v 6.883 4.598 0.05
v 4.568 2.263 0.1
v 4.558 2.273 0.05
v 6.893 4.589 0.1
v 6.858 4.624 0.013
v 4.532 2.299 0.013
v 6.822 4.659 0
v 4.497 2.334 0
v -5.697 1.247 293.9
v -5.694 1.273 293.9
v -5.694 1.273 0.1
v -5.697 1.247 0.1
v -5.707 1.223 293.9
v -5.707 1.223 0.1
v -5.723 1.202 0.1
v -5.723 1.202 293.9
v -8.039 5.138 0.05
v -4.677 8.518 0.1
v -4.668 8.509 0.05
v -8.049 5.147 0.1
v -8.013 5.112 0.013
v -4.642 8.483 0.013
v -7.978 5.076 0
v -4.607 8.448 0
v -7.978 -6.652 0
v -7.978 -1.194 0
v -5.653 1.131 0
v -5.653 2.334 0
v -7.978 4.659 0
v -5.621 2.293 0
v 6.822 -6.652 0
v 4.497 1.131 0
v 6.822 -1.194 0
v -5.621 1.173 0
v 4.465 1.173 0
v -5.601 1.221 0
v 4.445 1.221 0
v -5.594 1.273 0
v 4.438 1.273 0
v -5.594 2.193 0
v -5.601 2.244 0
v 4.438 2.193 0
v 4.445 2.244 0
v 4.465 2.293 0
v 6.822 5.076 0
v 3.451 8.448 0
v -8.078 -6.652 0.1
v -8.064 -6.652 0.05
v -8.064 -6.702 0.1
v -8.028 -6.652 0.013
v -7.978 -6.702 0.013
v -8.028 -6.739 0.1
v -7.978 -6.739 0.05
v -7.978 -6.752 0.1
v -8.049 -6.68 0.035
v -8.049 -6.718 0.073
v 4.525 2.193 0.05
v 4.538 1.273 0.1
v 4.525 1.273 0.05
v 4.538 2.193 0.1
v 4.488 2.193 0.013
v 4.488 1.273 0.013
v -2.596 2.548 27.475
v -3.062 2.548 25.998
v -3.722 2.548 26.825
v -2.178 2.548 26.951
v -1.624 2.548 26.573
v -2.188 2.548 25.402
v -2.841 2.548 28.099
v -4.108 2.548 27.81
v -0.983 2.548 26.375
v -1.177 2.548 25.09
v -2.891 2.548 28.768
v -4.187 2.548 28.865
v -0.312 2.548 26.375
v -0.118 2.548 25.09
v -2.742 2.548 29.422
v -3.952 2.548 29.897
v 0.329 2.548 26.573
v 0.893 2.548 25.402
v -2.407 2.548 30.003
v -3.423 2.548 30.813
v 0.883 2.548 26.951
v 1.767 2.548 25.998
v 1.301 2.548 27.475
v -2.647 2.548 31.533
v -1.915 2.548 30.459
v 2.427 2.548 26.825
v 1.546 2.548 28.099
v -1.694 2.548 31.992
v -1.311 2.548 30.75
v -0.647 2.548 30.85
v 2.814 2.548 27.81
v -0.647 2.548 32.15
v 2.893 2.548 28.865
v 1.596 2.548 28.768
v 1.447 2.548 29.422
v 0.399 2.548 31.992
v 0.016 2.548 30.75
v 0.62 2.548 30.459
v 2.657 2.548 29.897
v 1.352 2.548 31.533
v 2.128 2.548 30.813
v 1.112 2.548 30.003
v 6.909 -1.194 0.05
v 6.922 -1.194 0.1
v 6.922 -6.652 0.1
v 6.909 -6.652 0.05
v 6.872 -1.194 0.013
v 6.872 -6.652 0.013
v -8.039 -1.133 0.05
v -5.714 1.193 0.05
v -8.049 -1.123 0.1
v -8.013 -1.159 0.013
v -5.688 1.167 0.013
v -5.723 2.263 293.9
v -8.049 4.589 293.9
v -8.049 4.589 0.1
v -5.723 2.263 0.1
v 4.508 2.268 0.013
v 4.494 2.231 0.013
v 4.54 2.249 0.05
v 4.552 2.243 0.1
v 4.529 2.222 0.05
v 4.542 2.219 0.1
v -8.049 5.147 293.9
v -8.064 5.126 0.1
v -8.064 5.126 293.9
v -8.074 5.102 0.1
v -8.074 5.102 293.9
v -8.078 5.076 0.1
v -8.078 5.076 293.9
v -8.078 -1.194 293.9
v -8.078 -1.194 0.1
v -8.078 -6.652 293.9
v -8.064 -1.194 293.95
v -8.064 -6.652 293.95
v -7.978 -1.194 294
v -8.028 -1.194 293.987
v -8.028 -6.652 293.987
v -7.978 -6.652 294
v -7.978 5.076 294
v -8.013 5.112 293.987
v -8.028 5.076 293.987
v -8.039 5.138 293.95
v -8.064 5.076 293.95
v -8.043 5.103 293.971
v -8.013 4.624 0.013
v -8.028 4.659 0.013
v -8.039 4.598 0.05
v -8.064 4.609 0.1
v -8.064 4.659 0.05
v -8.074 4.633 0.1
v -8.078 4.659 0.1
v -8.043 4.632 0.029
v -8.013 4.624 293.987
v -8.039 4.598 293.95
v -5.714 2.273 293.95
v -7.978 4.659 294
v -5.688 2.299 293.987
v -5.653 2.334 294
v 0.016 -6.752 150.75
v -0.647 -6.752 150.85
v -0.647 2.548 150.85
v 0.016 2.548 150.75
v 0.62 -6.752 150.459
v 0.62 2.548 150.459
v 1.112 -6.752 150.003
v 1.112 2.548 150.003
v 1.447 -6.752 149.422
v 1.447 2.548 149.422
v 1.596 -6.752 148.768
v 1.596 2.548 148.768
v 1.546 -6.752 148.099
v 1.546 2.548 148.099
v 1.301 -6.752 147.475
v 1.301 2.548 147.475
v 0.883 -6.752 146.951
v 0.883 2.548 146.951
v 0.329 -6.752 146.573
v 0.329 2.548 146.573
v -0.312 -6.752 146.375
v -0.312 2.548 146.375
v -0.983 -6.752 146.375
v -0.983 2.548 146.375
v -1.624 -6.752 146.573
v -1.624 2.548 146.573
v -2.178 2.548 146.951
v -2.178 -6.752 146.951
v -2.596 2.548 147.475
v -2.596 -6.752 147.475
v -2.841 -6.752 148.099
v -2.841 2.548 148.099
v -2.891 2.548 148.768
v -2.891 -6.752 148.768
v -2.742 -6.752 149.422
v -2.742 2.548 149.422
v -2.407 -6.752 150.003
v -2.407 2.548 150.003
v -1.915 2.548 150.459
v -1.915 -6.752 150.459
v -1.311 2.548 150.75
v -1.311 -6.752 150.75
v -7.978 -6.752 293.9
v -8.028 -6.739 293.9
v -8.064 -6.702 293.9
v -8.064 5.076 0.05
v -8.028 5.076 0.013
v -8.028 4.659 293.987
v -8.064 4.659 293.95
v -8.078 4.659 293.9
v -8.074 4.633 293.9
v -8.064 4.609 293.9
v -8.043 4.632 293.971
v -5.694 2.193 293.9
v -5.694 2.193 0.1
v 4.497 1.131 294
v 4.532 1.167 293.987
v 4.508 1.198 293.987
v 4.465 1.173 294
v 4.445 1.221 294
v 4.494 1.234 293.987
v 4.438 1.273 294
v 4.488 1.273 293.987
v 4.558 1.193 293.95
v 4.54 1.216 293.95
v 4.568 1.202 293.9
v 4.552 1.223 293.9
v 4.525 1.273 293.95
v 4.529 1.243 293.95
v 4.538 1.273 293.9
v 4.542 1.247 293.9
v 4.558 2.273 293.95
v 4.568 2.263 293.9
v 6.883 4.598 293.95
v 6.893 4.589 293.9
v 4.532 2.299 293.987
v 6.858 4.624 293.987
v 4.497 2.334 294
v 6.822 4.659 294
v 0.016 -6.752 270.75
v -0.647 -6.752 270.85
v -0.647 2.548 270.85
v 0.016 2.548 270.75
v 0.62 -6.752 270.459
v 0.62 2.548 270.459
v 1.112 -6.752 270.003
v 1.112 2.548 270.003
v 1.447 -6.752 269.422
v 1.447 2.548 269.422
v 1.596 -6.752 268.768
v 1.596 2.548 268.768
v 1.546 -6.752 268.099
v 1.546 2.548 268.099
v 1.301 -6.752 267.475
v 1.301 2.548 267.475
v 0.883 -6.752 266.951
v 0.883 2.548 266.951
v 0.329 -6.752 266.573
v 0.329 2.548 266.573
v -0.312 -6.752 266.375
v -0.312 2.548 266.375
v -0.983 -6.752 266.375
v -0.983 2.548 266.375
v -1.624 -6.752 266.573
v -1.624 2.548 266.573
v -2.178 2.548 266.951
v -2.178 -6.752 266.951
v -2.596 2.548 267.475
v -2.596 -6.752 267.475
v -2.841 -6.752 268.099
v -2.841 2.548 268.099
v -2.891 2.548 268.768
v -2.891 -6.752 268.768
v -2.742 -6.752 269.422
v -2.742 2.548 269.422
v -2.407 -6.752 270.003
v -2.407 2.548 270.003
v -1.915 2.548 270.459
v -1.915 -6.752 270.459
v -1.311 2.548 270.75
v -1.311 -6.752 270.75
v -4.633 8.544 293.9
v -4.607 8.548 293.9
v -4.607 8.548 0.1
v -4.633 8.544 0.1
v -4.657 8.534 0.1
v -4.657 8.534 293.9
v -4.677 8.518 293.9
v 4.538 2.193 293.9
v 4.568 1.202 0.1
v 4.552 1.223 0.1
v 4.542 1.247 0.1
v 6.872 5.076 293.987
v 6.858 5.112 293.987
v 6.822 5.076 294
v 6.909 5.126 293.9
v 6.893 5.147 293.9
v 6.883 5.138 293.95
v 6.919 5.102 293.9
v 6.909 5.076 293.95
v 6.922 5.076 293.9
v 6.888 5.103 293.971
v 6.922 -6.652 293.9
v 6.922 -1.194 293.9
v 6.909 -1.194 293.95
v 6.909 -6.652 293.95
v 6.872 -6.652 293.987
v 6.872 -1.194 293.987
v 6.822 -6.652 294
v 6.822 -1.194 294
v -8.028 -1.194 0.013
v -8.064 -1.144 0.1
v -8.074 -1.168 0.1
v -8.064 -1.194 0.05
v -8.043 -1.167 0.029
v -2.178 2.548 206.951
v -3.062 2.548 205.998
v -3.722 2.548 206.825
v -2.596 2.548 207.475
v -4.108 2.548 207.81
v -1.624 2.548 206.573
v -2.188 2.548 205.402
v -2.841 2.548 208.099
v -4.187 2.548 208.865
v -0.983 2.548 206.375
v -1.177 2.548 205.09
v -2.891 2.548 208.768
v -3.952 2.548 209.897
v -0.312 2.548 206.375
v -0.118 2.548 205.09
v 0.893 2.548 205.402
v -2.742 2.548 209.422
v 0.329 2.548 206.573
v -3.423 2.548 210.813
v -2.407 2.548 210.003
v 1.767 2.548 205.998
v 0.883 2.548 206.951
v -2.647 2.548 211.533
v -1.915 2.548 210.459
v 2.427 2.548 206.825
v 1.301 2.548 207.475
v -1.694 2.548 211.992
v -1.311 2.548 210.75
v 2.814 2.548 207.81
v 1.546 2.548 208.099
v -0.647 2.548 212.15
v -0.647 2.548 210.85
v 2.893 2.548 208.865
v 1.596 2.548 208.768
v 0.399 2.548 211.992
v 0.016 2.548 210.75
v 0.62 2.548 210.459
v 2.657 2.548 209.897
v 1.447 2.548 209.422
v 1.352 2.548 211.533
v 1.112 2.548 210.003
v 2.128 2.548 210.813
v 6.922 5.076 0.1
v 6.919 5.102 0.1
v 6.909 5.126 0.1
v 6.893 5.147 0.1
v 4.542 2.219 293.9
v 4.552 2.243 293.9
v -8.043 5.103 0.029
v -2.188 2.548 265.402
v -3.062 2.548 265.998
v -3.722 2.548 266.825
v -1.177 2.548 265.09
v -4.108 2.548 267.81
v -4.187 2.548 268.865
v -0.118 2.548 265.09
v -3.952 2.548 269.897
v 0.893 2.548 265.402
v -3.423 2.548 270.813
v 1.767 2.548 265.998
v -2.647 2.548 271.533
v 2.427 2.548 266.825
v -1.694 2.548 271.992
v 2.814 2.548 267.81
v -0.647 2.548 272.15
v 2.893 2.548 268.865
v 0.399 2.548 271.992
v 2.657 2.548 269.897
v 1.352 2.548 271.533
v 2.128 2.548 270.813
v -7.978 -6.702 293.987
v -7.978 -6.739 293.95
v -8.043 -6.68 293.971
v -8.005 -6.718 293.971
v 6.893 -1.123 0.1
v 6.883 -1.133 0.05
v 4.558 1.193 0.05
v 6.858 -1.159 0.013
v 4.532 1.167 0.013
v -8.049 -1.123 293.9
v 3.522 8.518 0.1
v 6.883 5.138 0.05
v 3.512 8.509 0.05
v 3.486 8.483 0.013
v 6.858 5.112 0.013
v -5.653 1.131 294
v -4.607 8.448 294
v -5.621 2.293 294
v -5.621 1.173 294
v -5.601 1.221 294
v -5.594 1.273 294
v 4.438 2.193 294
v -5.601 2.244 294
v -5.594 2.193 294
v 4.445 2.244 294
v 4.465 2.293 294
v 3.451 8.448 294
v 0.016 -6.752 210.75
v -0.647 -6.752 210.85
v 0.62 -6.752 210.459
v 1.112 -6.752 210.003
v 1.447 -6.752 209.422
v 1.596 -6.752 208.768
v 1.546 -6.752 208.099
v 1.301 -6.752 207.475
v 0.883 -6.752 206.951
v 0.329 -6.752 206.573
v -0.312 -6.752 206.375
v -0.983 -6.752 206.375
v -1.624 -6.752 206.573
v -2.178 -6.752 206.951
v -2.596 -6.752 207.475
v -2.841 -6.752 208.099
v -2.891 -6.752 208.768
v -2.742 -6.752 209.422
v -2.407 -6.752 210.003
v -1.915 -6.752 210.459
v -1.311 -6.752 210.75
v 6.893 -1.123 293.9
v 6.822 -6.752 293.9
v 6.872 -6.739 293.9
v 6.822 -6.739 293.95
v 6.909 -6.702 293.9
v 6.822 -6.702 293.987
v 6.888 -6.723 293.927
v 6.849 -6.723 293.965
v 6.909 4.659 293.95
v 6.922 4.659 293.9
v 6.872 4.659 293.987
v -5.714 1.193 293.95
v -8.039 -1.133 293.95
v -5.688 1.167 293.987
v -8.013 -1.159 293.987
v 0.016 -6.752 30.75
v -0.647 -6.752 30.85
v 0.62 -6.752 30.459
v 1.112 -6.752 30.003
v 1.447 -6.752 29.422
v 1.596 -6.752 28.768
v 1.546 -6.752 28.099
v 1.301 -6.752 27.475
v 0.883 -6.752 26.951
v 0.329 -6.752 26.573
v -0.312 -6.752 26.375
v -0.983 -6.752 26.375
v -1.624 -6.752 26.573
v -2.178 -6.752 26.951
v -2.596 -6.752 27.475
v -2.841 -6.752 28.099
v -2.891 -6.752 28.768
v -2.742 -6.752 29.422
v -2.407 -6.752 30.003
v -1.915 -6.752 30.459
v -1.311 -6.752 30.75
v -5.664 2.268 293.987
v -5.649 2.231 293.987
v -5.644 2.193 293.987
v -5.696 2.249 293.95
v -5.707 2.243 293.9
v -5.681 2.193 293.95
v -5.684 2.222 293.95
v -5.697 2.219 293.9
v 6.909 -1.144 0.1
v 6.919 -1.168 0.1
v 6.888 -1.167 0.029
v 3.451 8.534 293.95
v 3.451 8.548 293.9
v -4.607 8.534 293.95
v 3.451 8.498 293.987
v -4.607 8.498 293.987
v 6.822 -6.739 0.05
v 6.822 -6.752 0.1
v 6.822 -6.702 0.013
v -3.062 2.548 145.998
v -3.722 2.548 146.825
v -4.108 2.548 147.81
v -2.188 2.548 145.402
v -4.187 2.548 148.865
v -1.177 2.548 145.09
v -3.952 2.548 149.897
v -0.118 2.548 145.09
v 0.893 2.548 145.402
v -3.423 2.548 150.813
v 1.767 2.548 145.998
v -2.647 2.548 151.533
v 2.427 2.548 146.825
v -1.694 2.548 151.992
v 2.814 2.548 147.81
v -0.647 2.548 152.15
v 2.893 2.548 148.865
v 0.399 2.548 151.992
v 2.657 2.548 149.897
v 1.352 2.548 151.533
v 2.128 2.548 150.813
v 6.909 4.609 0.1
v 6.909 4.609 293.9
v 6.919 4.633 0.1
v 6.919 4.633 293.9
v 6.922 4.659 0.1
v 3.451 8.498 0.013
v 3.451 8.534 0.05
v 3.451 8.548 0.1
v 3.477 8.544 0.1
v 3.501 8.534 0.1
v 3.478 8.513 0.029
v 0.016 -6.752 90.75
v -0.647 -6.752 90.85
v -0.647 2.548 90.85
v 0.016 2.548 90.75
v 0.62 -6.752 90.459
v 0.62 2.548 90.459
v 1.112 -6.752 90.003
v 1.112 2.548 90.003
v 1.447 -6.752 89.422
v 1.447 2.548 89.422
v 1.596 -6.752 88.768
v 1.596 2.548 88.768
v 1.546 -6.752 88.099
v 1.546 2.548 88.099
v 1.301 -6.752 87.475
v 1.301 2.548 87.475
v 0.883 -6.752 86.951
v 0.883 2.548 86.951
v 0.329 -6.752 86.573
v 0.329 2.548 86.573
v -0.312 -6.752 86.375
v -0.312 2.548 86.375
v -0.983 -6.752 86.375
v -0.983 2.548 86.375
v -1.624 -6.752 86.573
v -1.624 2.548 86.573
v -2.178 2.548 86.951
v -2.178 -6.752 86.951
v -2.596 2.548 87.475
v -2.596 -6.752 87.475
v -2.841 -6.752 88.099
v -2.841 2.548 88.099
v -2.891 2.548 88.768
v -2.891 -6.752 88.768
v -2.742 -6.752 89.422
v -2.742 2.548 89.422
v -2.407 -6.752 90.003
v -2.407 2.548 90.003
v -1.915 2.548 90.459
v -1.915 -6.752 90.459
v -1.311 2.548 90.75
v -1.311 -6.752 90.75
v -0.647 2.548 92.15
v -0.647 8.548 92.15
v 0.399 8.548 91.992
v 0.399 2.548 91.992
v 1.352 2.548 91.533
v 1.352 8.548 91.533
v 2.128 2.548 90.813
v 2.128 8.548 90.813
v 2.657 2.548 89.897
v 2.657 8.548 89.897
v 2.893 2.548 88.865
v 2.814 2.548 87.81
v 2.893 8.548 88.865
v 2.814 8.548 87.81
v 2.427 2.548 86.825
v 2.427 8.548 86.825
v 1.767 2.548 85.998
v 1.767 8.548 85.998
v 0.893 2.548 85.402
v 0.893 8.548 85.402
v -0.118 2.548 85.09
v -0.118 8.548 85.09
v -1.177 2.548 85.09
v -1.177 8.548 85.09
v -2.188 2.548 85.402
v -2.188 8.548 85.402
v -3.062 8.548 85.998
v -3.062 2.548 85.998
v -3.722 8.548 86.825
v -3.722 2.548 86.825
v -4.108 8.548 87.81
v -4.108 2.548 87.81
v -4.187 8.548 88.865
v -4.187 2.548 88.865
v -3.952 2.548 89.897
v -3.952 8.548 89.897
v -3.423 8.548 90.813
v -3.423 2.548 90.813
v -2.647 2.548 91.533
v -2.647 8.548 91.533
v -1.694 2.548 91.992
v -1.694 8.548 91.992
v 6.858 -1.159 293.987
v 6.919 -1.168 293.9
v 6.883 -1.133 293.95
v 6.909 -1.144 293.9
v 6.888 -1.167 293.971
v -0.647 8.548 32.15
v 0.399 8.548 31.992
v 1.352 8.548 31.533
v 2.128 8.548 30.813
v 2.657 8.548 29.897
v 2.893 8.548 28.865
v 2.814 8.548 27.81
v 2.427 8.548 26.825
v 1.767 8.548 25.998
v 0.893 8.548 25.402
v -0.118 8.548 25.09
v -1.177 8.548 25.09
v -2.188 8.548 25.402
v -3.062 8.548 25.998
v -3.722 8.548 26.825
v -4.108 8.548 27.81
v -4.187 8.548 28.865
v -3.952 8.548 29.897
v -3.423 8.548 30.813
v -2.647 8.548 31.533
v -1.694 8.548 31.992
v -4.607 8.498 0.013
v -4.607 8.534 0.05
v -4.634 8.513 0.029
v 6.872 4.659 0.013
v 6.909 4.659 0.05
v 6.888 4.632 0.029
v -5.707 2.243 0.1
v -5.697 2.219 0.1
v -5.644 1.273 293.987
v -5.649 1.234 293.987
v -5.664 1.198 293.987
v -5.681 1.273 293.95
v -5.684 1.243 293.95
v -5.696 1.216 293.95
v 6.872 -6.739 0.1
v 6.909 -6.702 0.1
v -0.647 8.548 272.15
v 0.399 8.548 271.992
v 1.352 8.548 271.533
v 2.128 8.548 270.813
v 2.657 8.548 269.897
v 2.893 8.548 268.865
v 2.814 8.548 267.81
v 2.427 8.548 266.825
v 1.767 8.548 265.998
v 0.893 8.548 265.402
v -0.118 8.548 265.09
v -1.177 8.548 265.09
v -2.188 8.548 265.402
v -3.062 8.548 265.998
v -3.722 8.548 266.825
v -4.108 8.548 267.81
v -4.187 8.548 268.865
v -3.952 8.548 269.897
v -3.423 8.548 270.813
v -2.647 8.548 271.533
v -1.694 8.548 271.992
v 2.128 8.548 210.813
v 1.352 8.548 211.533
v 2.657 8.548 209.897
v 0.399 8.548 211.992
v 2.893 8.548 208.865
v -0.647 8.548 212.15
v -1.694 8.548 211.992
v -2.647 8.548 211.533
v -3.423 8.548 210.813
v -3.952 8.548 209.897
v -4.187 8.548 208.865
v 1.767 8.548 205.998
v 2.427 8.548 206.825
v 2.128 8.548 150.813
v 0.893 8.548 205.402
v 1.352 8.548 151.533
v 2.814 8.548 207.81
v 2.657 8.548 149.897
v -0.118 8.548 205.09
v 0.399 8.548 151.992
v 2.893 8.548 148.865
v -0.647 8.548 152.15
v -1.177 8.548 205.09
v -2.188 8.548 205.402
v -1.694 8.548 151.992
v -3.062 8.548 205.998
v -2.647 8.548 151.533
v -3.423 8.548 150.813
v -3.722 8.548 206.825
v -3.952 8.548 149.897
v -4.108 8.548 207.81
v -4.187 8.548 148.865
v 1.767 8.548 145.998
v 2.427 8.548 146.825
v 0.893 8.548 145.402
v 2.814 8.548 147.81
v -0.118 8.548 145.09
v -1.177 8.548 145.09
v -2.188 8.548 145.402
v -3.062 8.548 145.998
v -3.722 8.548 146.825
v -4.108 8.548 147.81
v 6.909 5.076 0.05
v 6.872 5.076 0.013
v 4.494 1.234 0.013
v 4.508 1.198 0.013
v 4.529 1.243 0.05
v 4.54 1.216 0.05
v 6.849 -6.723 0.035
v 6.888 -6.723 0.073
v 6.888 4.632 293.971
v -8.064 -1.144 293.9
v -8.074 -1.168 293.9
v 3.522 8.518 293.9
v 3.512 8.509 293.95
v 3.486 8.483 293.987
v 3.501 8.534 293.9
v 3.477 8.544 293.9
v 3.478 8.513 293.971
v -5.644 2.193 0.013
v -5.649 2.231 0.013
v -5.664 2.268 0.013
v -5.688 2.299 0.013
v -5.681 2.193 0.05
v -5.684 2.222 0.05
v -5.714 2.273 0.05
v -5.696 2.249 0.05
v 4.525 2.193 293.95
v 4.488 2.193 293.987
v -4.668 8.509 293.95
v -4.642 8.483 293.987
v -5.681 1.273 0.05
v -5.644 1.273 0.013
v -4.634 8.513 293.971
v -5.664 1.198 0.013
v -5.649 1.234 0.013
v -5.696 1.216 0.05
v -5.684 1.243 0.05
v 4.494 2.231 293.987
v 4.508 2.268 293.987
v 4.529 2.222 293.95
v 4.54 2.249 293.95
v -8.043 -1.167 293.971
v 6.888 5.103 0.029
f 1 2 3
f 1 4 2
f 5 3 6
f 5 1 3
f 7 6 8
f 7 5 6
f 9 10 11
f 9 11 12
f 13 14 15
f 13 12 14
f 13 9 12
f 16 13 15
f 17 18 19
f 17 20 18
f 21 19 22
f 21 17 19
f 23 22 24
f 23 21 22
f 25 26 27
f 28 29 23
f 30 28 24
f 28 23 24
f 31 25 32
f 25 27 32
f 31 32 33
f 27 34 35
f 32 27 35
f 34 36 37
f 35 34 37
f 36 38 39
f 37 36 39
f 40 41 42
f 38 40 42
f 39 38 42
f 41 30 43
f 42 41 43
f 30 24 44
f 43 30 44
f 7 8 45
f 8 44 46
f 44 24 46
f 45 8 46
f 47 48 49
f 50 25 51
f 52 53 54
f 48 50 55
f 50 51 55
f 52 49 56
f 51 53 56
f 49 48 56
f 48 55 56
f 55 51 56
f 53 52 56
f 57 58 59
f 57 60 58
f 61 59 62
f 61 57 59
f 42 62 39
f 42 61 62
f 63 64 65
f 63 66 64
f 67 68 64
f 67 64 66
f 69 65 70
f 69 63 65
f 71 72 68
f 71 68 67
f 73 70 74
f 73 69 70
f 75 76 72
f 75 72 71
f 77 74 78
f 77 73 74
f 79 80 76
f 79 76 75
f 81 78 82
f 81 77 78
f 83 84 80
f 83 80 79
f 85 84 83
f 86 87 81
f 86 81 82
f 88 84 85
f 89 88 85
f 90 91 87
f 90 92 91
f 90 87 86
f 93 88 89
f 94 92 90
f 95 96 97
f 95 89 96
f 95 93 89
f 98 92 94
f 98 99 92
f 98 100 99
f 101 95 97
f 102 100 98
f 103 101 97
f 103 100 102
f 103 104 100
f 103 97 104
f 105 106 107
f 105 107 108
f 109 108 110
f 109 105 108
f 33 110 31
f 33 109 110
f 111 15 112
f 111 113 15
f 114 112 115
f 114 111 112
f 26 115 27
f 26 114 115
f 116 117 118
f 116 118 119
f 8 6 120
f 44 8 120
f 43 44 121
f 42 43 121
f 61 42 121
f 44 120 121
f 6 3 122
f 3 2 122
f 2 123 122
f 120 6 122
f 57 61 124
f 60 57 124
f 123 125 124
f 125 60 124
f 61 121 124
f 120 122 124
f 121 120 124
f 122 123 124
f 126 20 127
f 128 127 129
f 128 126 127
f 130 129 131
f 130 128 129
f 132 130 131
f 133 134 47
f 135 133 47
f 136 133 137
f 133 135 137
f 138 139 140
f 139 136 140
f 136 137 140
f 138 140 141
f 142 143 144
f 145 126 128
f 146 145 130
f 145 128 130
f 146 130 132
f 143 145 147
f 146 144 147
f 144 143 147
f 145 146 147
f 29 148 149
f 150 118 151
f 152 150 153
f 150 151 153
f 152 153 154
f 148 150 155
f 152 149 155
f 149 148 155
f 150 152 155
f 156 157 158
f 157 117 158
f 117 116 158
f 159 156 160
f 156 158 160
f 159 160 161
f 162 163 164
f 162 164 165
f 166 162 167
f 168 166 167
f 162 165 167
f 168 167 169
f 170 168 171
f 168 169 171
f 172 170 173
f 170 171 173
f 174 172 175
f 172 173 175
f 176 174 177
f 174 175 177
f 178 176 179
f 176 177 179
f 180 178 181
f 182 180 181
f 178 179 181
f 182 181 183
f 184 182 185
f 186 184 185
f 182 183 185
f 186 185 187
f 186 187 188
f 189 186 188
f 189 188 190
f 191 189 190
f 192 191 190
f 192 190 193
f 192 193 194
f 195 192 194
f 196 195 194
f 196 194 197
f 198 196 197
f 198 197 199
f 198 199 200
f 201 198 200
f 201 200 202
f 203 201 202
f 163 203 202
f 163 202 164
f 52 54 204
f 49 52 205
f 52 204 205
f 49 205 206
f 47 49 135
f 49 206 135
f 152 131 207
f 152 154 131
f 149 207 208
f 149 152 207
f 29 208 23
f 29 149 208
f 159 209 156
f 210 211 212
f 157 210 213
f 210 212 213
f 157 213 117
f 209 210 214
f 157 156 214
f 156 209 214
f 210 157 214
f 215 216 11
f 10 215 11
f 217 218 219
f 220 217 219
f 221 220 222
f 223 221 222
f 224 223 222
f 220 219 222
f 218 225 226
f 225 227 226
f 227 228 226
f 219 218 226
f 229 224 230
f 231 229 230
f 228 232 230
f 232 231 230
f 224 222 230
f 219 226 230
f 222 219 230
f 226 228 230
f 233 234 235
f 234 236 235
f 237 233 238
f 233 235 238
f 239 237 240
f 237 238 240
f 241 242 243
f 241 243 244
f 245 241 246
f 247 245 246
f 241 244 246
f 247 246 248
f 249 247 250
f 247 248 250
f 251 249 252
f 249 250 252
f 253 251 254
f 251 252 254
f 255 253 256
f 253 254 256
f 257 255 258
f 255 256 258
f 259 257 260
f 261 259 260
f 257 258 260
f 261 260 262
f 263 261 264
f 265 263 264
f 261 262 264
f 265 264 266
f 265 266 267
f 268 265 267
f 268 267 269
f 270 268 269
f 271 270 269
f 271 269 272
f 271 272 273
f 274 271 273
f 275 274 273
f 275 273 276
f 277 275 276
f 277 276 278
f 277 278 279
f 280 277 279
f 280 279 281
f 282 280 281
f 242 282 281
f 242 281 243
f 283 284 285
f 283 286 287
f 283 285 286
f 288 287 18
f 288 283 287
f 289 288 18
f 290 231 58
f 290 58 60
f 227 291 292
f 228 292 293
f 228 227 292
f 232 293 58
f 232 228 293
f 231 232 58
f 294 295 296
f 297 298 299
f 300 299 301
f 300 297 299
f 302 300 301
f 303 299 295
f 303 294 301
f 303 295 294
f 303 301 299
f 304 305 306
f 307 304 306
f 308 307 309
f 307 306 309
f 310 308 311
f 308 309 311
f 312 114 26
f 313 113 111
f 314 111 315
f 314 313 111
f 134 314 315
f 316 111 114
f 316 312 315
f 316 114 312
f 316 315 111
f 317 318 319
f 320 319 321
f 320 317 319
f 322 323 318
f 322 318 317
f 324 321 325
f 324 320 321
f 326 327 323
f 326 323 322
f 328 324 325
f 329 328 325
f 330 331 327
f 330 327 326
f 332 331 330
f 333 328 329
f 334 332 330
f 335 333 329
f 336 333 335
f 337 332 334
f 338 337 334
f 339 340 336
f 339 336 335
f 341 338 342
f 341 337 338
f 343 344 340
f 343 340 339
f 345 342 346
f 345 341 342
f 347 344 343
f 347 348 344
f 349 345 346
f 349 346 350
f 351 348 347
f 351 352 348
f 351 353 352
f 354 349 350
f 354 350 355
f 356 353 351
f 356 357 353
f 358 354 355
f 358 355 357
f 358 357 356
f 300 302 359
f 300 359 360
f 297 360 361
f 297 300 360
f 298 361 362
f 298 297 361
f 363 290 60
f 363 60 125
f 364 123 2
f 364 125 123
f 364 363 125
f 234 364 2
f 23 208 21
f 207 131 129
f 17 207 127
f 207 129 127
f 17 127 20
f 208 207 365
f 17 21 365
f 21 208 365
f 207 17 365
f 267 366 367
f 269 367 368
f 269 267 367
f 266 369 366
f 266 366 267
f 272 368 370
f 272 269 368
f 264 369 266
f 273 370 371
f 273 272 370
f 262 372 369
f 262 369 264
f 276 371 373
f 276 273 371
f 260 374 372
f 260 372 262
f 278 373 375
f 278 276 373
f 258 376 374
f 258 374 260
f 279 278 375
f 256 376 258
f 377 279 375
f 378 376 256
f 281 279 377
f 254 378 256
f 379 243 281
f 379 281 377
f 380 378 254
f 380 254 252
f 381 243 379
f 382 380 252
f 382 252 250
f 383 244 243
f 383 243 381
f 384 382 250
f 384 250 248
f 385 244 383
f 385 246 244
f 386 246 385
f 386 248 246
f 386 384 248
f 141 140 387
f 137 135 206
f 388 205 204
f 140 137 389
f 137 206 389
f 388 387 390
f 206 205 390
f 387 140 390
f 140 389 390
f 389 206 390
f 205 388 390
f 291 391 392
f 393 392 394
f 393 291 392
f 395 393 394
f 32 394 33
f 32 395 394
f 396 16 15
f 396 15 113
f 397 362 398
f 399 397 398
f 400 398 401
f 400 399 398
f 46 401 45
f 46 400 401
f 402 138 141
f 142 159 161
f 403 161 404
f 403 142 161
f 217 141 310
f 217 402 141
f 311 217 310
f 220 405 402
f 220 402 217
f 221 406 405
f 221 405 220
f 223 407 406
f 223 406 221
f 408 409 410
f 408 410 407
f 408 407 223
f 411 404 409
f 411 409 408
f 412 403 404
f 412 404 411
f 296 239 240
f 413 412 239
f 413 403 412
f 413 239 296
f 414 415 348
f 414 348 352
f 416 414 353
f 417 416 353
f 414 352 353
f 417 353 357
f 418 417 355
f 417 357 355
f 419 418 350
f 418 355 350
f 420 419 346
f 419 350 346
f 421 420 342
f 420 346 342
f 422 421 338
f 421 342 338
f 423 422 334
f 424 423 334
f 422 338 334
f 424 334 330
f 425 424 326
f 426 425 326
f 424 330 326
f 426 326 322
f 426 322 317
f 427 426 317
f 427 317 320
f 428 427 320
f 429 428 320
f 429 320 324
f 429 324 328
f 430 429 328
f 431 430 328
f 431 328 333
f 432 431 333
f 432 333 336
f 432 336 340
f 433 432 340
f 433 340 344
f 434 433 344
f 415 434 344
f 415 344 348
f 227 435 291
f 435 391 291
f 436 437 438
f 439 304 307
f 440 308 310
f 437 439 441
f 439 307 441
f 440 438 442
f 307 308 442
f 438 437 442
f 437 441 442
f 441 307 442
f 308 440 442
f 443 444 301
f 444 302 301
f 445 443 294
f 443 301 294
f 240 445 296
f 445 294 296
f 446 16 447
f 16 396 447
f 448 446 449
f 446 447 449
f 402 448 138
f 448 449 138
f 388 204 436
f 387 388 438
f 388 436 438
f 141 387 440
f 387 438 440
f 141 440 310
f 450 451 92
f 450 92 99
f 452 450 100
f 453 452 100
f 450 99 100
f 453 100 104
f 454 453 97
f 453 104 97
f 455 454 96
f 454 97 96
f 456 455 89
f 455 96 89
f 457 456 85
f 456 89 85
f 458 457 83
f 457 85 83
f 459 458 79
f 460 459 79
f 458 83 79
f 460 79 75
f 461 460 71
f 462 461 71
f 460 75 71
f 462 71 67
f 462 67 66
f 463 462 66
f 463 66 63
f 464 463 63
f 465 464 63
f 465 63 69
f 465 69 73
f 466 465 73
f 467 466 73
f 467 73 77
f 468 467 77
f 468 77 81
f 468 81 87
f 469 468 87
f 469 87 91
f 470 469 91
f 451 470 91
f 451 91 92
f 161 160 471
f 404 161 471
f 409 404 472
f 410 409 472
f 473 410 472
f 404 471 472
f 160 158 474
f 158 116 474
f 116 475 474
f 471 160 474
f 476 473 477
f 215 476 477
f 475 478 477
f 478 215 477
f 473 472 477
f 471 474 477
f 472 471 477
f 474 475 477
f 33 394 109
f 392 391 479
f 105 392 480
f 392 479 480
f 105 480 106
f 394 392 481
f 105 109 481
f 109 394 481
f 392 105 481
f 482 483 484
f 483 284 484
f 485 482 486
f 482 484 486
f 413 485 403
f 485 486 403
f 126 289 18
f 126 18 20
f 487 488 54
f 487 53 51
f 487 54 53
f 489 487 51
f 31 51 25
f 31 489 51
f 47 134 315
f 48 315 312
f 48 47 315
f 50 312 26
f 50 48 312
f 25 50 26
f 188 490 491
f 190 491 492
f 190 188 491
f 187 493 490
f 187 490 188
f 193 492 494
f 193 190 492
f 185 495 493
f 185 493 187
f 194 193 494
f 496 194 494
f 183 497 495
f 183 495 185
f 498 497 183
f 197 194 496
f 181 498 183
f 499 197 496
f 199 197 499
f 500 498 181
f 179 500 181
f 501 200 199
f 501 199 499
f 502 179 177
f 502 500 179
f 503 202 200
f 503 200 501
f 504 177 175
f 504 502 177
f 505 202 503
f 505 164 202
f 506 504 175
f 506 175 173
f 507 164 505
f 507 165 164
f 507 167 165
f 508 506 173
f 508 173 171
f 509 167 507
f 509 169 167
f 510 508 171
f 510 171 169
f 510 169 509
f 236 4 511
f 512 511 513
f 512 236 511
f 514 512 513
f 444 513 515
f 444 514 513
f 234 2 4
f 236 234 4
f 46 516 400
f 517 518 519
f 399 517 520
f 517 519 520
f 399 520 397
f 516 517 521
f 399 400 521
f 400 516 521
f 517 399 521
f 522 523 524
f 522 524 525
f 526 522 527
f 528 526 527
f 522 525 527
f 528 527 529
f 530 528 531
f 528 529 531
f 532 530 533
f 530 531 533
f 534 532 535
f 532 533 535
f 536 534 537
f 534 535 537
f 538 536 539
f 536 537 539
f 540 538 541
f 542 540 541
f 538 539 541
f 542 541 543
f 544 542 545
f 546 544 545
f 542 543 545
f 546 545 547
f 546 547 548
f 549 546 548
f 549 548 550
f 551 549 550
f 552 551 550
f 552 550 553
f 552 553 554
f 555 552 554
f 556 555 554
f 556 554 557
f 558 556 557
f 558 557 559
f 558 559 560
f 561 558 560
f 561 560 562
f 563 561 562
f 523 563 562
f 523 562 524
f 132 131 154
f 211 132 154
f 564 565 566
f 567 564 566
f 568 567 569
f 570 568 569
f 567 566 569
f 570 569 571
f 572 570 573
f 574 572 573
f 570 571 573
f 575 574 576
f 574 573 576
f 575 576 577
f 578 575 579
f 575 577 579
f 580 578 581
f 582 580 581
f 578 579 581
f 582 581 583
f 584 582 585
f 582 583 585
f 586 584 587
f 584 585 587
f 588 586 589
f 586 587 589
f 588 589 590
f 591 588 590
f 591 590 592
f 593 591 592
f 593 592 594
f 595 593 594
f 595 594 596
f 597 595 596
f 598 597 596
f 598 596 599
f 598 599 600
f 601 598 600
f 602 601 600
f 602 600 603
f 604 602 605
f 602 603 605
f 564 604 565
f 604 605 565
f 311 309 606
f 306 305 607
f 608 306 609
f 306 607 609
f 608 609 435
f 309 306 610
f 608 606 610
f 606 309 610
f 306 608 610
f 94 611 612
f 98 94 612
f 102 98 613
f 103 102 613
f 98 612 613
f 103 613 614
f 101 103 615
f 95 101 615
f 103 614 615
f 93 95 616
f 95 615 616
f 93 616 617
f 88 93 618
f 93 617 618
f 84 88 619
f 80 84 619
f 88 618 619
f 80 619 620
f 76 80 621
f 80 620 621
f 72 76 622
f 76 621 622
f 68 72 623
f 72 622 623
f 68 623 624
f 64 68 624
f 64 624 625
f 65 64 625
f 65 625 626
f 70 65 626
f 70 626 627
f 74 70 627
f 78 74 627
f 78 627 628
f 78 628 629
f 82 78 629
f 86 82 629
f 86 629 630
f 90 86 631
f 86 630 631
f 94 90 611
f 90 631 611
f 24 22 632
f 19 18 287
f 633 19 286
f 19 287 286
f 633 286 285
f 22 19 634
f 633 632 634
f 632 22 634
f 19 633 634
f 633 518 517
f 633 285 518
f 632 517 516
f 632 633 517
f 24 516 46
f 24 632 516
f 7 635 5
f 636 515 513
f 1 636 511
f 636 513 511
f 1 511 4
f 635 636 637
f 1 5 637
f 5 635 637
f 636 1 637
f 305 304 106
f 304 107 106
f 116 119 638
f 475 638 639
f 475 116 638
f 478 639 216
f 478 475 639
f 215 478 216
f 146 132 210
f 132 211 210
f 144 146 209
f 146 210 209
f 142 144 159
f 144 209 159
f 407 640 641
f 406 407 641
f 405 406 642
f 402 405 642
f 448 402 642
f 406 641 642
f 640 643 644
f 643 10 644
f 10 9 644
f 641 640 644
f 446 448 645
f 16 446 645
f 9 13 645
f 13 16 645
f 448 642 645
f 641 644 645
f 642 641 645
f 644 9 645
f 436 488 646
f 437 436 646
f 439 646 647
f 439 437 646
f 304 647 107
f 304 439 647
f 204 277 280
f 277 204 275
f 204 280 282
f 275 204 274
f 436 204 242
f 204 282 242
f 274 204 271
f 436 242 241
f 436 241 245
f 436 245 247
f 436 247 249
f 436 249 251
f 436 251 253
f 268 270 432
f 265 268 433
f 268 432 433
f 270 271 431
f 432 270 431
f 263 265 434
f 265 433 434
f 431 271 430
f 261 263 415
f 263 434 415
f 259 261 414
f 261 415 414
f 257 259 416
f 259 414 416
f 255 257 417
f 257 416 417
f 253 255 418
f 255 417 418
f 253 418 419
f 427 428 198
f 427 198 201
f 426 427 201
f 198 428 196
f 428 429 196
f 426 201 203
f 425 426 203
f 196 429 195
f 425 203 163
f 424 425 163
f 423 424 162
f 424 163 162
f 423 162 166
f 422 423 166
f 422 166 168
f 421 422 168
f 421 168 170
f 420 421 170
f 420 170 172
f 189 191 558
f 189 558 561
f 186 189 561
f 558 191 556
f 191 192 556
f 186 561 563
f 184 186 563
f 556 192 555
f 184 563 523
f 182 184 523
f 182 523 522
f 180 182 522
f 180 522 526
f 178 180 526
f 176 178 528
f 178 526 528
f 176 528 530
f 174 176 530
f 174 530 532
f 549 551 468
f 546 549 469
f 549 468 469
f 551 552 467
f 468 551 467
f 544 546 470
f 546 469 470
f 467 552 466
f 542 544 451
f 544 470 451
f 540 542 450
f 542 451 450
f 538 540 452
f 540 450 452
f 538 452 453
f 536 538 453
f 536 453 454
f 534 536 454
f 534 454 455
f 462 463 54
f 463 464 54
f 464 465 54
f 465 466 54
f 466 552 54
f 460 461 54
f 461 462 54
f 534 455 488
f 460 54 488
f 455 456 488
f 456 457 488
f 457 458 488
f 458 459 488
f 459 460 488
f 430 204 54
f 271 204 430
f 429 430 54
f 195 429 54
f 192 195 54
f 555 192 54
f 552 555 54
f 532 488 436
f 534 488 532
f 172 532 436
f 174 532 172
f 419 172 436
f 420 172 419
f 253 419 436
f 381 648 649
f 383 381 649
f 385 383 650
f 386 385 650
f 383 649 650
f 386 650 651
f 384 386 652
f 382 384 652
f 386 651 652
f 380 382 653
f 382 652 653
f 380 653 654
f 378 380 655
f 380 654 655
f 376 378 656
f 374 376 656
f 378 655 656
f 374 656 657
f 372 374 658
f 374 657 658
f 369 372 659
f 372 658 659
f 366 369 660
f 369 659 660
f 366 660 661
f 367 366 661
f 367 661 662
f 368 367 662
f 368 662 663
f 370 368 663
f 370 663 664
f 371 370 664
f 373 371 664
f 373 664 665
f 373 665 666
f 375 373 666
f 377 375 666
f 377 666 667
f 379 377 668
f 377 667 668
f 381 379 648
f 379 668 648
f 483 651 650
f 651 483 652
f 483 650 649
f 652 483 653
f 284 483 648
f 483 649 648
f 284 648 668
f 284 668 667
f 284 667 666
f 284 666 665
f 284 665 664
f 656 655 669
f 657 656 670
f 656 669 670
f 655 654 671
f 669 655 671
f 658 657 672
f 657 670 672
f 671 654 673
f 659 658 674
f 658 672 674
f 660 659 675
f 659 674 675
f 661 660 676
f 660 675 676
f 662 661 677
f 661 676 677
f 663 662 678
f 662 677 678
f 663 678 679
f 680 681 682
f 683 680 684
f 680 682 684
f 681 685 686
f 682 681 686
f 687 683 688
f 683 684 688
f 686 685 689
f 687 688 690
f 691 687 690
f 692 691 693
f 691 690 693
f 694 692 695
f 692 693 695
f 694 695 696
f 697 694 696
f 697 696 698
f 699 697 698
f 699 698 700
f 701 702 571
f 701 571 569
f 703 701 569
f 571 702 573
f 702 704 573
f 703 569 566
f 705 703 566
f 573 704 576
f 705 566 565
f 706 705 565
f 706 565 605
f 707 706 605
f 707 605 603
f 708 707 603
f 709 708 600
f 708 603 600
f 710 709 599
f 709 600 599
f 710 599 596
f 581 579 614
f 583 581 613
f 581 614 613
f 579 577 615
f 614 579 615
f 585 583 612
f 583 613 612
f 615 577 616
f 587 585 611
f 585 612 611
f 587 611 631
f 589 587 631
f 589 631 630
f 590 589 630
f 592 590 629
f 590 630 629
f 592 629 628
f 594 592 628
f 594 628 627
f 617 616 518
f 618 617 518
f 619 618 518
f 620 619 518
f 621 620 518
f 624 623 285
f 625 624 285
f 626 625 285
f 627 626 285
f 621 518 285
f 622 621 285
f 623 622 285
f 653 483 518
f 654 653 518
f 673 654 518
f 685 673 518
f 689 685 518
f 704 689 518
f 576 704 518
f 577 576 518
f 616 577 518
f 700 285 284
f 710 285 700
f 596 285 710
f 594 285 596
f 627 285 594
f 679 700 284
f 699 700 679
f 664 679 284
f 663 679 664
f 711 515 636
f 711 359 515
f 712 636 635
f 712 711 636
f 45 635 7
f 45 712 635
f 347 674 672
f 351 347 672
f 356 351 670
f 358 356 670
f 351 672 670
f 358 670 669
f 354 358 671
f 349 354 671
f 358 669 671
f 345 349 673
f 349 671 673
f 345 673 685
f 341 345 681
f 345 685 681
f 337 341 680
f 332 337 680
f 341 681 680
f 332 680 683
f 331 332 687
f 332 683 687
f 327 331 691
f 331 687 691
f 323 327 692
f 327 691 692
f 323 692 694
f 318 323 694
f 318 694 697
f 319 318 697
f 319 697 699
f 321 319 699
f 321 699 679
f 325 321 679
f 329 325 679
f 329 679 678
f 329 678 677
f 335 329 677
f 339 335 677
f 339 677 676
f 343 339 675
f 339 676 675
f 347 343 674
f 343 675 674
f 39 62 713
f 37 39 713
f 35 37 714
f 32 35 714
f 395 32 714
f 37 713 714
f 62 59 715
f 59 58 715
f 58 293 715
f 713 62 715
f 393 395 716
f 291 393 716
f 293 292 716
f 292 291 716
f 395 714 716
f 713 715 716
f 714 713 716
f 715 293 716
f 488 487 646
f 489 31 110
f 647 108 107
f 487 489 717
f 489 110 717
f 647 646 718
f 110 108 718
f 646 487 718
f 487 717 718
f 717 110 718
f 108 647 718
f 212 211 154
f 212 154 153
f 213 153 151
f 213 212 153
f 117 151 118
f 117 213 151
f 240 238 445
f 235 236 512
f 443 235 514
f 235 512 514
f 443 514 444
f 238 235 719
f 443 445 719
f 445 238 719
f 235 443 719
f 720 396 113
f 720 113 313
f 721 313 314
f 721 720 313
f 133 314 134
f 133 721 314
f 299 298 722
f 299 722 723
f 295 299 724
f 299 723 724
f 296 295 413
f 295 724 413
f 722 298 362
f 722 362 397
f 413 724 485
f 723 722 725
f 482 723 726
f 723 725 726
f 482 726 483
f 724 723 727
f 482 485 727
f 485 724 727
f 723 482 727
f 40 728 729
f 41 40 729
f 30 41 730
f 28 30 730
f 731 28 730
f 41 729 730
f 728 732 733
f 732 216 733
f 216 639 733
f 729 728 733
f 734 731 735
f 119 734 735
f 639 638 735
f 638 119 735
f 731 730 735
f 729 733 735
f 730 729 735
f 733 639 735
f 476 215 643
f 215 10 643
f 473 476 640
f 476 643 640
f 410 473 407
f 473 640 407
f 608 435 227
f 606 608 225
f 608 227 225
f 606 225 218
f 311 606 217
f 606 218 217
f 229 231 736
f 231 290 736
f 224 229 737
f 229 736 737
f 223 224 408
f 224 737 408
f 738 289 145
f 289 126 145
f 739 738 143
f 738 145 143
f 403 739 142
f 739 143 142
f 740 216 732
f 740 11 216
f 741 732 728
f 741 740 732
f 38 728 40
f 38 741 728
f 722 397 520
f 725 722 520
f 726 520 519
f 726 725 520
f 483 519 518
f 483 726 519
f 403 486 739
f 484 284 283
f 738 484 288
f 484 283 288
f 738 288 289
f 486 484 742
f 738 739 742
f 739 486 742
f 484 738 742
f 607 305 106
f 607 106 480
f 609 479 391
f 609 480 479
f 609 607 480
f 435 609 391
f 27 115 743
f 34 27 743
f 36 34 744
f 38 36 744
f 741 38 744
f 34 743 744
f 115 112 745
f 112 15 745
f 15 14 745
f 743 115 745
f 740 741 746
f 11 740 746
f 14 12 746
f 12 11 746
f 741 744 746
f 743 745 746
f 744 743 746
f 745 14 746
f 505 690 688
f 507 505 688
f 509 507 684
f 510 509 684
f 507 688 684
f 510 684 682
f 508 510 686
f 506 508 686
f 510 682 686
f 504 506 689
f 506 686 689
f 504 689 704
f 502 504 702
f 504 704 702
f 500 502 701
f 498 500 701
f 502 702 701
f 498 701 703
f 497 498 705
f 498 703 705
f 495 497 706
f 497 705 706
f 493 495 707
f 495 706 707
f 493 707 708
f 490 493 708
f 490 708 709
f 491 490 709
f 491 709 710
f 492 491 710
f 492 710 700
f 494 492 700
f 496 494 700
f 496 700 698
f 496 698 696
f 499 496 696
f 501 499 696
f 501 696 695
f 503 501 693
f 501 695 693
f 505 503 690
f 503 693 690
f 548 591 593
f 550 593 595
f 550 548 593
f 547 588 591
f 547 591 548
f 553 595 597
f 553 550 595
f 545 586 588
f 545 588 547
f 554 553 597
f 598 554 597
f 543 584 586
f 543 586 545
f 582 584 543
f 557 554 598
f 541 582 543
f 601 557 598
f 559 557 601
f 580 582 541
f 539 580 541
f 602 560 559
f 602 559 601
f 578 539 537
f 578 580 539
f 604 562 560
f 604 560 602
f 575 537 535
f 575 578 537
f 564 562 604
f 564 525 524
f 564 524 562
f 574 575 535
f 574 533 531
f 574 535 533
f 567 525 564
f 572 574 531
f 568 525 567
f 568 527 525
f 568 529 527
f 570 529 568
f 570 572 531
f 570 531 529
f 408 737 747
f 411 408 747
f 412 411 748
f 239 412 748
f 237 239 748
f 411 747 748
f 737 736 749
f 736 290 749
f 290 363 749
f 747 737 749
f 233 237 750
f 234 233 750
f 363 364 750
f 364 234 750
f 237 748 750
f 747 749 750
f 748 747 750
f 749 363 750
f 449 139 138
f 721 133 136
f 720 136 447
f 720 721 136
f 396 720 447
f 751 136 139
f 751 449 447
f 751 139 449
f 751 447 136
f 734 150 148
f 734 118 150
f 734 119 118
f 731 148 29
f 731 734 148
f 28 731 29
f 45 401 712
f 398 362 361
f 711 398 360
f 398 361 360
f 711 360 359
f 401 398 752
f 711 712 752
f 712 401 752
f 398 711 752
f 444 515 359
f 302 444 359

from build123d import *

# Parameters (mm, degrees)
EXTRUDE_1_DEPTH        = 294
FILLET_1_R             = 0.1
SKETCH_2_R             = 3.55
CUT_EXTRUDE_1_DEPTH    = 6
PATTERN_LINEAR_1_COUNT = 20
PATTERN_LINEAR_1_PITCH = 60
SKETCH_3_R             = 2.25
CUT_EXTRUDE_3_DEPTH    = 20
PATTERN_LINEAR_2_COUNT = 20
PATTERN_LINEAR_2_PITCH = 60


with BuildPart() as part:
    # Эскиз1 → Бобышка-Вытянуть1 (new body)
    with BuildSketch(Plane.XY):
        Polygon((-8.077815221, -6.752458719), (6.922184779, -6.752458719), (6.922184779, -1.152458719), (4.538392714, 1.231333345), (4.538392714, 2.234063435), (6.922184779, 4.617855499), (6.922184779, 5.117855499), (3.492498997, 8.547541281), (-4.64812944, 8.547541281), (-8.077815221, 5.117855499), (-8.077815221, 4.617855499), (-5.694023157, 2.234063435), (-5.694023157, 1.231333345), (-8.077815221, -1.152458719), align=None)
    extrude(amount=EXTRUDE_1_DEPTH)

    # Скругление1
    fillet_1_edges = [part.edges().sort_by_distance(p)[0] for p in [
        (6.922184779, -3.952458719, 294),
        (-6.885919189, 0.039437313, 0),
        (-5.694023157, 1.73269839, 0),
        (5.730288746, 0.039437313, 294),
        (-6.885919189, 3.425959467, 0),
        (-8.077815221, 4.867855499, 0),
        (-6.362972331, 6.83269839, 0),
        (-0.577815221, 8.547541281, 0),
        (5.207341888, 6.83269839, 0),
        (6.922184779, 4.867855499, 0),
        (5.730288746, 3.425959467, 0),
        (4.538392714, 1.73269839, 294),
        (4.538392714, 1.73269839, 0),
        (5.730288746, 0.039437313, 0),
        (6.922184779, -3.952458719, 0),
        (-0.577815221, -6.752458719, 0),
        (-8.077815221, -3.952458719, 0),
        (5.730288746, 3.425959467, 294),
        (6.922184779, 4.867855499, 294),
        (-8.077815221, -1.152458719, 147),
        (-5.694023157, 1.231333345, 147),
        (-5.694023157, 2.234063435, 147),
        (-8.077815221, 4.617855499, 147),
        (-8.077815221, 5.117855499, 147),
        (-4.64812944, 8.547541281, 147),
        (3.492498997, 8.547541281, 147),
        (6.922184779, 5.117855499, 147),
        (6.922184779, 4.617855499, 147),
        (4.538392714, 2.234063435, 147),
        (4.538392714, 1.231333345, 147),
        (6.922184779, -1.152458719, 147),
        (6.922184779, -6.752458719, 147),
        (-8.077815221, -6.752458719, 147),
        (5.207341888, 6.83269839, 294),
        (-0.577815221, 8.547541281, 294),
        (-6.362972331, 6.83269839, 294),
        (-8.077815221, 4.867855499, 294),
        (-6.885919189, 3.425959467, 294),
        (-8.077815221, -3.952458719, 294),
        (-5.694023157, 1.73269839, 294),
        (-6.885919189, 0.039437313, 294),
        (-0.577815221, -6.752458719, 294),
    ]]
    fillet(fillet_1_edges, radius=FILLET_1_R)

    # Эскиз2 → Вырез-Вытянуть1 (cut)
    with BuildSketch(Plane(origin=(0, 8.547541281, 0), x_dir=(1, 0, 0), z_dir=(0, 1, 0))):
        with Locations(Location((-0.647418762, -28.6, 0), (0, 0, 270))):
            Circle(SKETCH_2_R)
    cut_extrude_1 = extrude(amount=-CUT_EXTRUDE_1_DEPTH, mode=Mode.SUBTRACT)

    # Линейный массив1: Вырез-Вытянуть1 ×20
    with Locations(*[(0, 0, i * PATTERN_LINEAR_1_PITCH) for i in range(1, PATTERN_LINEAR_1_COUNT)]):
        add(cut_extrude_1, mode=Mode.SUBTRACT)

    # Эскиз3 → Вырез-Вытянуть3 (cut)
    with BuildSketch(Plane(origin=(0, 2.547541281, 0), x_dir=(1, 0, 0), z_dir=(0, 1, 0))):
        with Locations(Location((-0.647418762, -28.6, 0), (0, 0, 270))):
            Circle(SKETCH_3_R)
    cut_extrude_3 = extrude(amount=-CUT_EXTRUDE_3_DEPTH, mode=Mode.SUBTRACT)

    # Линейный массив2: Вырез-Вытянуть3 ×20
    with Locations(*[(0, 0, i * PATTERN_LINEAR_2_PITCH) for i in range(1, PATTERN_LINEAR_2_COUNT)]):
        add(cut_extrude_3, mode=Mode.SUBTRACT)


solid = part.part
